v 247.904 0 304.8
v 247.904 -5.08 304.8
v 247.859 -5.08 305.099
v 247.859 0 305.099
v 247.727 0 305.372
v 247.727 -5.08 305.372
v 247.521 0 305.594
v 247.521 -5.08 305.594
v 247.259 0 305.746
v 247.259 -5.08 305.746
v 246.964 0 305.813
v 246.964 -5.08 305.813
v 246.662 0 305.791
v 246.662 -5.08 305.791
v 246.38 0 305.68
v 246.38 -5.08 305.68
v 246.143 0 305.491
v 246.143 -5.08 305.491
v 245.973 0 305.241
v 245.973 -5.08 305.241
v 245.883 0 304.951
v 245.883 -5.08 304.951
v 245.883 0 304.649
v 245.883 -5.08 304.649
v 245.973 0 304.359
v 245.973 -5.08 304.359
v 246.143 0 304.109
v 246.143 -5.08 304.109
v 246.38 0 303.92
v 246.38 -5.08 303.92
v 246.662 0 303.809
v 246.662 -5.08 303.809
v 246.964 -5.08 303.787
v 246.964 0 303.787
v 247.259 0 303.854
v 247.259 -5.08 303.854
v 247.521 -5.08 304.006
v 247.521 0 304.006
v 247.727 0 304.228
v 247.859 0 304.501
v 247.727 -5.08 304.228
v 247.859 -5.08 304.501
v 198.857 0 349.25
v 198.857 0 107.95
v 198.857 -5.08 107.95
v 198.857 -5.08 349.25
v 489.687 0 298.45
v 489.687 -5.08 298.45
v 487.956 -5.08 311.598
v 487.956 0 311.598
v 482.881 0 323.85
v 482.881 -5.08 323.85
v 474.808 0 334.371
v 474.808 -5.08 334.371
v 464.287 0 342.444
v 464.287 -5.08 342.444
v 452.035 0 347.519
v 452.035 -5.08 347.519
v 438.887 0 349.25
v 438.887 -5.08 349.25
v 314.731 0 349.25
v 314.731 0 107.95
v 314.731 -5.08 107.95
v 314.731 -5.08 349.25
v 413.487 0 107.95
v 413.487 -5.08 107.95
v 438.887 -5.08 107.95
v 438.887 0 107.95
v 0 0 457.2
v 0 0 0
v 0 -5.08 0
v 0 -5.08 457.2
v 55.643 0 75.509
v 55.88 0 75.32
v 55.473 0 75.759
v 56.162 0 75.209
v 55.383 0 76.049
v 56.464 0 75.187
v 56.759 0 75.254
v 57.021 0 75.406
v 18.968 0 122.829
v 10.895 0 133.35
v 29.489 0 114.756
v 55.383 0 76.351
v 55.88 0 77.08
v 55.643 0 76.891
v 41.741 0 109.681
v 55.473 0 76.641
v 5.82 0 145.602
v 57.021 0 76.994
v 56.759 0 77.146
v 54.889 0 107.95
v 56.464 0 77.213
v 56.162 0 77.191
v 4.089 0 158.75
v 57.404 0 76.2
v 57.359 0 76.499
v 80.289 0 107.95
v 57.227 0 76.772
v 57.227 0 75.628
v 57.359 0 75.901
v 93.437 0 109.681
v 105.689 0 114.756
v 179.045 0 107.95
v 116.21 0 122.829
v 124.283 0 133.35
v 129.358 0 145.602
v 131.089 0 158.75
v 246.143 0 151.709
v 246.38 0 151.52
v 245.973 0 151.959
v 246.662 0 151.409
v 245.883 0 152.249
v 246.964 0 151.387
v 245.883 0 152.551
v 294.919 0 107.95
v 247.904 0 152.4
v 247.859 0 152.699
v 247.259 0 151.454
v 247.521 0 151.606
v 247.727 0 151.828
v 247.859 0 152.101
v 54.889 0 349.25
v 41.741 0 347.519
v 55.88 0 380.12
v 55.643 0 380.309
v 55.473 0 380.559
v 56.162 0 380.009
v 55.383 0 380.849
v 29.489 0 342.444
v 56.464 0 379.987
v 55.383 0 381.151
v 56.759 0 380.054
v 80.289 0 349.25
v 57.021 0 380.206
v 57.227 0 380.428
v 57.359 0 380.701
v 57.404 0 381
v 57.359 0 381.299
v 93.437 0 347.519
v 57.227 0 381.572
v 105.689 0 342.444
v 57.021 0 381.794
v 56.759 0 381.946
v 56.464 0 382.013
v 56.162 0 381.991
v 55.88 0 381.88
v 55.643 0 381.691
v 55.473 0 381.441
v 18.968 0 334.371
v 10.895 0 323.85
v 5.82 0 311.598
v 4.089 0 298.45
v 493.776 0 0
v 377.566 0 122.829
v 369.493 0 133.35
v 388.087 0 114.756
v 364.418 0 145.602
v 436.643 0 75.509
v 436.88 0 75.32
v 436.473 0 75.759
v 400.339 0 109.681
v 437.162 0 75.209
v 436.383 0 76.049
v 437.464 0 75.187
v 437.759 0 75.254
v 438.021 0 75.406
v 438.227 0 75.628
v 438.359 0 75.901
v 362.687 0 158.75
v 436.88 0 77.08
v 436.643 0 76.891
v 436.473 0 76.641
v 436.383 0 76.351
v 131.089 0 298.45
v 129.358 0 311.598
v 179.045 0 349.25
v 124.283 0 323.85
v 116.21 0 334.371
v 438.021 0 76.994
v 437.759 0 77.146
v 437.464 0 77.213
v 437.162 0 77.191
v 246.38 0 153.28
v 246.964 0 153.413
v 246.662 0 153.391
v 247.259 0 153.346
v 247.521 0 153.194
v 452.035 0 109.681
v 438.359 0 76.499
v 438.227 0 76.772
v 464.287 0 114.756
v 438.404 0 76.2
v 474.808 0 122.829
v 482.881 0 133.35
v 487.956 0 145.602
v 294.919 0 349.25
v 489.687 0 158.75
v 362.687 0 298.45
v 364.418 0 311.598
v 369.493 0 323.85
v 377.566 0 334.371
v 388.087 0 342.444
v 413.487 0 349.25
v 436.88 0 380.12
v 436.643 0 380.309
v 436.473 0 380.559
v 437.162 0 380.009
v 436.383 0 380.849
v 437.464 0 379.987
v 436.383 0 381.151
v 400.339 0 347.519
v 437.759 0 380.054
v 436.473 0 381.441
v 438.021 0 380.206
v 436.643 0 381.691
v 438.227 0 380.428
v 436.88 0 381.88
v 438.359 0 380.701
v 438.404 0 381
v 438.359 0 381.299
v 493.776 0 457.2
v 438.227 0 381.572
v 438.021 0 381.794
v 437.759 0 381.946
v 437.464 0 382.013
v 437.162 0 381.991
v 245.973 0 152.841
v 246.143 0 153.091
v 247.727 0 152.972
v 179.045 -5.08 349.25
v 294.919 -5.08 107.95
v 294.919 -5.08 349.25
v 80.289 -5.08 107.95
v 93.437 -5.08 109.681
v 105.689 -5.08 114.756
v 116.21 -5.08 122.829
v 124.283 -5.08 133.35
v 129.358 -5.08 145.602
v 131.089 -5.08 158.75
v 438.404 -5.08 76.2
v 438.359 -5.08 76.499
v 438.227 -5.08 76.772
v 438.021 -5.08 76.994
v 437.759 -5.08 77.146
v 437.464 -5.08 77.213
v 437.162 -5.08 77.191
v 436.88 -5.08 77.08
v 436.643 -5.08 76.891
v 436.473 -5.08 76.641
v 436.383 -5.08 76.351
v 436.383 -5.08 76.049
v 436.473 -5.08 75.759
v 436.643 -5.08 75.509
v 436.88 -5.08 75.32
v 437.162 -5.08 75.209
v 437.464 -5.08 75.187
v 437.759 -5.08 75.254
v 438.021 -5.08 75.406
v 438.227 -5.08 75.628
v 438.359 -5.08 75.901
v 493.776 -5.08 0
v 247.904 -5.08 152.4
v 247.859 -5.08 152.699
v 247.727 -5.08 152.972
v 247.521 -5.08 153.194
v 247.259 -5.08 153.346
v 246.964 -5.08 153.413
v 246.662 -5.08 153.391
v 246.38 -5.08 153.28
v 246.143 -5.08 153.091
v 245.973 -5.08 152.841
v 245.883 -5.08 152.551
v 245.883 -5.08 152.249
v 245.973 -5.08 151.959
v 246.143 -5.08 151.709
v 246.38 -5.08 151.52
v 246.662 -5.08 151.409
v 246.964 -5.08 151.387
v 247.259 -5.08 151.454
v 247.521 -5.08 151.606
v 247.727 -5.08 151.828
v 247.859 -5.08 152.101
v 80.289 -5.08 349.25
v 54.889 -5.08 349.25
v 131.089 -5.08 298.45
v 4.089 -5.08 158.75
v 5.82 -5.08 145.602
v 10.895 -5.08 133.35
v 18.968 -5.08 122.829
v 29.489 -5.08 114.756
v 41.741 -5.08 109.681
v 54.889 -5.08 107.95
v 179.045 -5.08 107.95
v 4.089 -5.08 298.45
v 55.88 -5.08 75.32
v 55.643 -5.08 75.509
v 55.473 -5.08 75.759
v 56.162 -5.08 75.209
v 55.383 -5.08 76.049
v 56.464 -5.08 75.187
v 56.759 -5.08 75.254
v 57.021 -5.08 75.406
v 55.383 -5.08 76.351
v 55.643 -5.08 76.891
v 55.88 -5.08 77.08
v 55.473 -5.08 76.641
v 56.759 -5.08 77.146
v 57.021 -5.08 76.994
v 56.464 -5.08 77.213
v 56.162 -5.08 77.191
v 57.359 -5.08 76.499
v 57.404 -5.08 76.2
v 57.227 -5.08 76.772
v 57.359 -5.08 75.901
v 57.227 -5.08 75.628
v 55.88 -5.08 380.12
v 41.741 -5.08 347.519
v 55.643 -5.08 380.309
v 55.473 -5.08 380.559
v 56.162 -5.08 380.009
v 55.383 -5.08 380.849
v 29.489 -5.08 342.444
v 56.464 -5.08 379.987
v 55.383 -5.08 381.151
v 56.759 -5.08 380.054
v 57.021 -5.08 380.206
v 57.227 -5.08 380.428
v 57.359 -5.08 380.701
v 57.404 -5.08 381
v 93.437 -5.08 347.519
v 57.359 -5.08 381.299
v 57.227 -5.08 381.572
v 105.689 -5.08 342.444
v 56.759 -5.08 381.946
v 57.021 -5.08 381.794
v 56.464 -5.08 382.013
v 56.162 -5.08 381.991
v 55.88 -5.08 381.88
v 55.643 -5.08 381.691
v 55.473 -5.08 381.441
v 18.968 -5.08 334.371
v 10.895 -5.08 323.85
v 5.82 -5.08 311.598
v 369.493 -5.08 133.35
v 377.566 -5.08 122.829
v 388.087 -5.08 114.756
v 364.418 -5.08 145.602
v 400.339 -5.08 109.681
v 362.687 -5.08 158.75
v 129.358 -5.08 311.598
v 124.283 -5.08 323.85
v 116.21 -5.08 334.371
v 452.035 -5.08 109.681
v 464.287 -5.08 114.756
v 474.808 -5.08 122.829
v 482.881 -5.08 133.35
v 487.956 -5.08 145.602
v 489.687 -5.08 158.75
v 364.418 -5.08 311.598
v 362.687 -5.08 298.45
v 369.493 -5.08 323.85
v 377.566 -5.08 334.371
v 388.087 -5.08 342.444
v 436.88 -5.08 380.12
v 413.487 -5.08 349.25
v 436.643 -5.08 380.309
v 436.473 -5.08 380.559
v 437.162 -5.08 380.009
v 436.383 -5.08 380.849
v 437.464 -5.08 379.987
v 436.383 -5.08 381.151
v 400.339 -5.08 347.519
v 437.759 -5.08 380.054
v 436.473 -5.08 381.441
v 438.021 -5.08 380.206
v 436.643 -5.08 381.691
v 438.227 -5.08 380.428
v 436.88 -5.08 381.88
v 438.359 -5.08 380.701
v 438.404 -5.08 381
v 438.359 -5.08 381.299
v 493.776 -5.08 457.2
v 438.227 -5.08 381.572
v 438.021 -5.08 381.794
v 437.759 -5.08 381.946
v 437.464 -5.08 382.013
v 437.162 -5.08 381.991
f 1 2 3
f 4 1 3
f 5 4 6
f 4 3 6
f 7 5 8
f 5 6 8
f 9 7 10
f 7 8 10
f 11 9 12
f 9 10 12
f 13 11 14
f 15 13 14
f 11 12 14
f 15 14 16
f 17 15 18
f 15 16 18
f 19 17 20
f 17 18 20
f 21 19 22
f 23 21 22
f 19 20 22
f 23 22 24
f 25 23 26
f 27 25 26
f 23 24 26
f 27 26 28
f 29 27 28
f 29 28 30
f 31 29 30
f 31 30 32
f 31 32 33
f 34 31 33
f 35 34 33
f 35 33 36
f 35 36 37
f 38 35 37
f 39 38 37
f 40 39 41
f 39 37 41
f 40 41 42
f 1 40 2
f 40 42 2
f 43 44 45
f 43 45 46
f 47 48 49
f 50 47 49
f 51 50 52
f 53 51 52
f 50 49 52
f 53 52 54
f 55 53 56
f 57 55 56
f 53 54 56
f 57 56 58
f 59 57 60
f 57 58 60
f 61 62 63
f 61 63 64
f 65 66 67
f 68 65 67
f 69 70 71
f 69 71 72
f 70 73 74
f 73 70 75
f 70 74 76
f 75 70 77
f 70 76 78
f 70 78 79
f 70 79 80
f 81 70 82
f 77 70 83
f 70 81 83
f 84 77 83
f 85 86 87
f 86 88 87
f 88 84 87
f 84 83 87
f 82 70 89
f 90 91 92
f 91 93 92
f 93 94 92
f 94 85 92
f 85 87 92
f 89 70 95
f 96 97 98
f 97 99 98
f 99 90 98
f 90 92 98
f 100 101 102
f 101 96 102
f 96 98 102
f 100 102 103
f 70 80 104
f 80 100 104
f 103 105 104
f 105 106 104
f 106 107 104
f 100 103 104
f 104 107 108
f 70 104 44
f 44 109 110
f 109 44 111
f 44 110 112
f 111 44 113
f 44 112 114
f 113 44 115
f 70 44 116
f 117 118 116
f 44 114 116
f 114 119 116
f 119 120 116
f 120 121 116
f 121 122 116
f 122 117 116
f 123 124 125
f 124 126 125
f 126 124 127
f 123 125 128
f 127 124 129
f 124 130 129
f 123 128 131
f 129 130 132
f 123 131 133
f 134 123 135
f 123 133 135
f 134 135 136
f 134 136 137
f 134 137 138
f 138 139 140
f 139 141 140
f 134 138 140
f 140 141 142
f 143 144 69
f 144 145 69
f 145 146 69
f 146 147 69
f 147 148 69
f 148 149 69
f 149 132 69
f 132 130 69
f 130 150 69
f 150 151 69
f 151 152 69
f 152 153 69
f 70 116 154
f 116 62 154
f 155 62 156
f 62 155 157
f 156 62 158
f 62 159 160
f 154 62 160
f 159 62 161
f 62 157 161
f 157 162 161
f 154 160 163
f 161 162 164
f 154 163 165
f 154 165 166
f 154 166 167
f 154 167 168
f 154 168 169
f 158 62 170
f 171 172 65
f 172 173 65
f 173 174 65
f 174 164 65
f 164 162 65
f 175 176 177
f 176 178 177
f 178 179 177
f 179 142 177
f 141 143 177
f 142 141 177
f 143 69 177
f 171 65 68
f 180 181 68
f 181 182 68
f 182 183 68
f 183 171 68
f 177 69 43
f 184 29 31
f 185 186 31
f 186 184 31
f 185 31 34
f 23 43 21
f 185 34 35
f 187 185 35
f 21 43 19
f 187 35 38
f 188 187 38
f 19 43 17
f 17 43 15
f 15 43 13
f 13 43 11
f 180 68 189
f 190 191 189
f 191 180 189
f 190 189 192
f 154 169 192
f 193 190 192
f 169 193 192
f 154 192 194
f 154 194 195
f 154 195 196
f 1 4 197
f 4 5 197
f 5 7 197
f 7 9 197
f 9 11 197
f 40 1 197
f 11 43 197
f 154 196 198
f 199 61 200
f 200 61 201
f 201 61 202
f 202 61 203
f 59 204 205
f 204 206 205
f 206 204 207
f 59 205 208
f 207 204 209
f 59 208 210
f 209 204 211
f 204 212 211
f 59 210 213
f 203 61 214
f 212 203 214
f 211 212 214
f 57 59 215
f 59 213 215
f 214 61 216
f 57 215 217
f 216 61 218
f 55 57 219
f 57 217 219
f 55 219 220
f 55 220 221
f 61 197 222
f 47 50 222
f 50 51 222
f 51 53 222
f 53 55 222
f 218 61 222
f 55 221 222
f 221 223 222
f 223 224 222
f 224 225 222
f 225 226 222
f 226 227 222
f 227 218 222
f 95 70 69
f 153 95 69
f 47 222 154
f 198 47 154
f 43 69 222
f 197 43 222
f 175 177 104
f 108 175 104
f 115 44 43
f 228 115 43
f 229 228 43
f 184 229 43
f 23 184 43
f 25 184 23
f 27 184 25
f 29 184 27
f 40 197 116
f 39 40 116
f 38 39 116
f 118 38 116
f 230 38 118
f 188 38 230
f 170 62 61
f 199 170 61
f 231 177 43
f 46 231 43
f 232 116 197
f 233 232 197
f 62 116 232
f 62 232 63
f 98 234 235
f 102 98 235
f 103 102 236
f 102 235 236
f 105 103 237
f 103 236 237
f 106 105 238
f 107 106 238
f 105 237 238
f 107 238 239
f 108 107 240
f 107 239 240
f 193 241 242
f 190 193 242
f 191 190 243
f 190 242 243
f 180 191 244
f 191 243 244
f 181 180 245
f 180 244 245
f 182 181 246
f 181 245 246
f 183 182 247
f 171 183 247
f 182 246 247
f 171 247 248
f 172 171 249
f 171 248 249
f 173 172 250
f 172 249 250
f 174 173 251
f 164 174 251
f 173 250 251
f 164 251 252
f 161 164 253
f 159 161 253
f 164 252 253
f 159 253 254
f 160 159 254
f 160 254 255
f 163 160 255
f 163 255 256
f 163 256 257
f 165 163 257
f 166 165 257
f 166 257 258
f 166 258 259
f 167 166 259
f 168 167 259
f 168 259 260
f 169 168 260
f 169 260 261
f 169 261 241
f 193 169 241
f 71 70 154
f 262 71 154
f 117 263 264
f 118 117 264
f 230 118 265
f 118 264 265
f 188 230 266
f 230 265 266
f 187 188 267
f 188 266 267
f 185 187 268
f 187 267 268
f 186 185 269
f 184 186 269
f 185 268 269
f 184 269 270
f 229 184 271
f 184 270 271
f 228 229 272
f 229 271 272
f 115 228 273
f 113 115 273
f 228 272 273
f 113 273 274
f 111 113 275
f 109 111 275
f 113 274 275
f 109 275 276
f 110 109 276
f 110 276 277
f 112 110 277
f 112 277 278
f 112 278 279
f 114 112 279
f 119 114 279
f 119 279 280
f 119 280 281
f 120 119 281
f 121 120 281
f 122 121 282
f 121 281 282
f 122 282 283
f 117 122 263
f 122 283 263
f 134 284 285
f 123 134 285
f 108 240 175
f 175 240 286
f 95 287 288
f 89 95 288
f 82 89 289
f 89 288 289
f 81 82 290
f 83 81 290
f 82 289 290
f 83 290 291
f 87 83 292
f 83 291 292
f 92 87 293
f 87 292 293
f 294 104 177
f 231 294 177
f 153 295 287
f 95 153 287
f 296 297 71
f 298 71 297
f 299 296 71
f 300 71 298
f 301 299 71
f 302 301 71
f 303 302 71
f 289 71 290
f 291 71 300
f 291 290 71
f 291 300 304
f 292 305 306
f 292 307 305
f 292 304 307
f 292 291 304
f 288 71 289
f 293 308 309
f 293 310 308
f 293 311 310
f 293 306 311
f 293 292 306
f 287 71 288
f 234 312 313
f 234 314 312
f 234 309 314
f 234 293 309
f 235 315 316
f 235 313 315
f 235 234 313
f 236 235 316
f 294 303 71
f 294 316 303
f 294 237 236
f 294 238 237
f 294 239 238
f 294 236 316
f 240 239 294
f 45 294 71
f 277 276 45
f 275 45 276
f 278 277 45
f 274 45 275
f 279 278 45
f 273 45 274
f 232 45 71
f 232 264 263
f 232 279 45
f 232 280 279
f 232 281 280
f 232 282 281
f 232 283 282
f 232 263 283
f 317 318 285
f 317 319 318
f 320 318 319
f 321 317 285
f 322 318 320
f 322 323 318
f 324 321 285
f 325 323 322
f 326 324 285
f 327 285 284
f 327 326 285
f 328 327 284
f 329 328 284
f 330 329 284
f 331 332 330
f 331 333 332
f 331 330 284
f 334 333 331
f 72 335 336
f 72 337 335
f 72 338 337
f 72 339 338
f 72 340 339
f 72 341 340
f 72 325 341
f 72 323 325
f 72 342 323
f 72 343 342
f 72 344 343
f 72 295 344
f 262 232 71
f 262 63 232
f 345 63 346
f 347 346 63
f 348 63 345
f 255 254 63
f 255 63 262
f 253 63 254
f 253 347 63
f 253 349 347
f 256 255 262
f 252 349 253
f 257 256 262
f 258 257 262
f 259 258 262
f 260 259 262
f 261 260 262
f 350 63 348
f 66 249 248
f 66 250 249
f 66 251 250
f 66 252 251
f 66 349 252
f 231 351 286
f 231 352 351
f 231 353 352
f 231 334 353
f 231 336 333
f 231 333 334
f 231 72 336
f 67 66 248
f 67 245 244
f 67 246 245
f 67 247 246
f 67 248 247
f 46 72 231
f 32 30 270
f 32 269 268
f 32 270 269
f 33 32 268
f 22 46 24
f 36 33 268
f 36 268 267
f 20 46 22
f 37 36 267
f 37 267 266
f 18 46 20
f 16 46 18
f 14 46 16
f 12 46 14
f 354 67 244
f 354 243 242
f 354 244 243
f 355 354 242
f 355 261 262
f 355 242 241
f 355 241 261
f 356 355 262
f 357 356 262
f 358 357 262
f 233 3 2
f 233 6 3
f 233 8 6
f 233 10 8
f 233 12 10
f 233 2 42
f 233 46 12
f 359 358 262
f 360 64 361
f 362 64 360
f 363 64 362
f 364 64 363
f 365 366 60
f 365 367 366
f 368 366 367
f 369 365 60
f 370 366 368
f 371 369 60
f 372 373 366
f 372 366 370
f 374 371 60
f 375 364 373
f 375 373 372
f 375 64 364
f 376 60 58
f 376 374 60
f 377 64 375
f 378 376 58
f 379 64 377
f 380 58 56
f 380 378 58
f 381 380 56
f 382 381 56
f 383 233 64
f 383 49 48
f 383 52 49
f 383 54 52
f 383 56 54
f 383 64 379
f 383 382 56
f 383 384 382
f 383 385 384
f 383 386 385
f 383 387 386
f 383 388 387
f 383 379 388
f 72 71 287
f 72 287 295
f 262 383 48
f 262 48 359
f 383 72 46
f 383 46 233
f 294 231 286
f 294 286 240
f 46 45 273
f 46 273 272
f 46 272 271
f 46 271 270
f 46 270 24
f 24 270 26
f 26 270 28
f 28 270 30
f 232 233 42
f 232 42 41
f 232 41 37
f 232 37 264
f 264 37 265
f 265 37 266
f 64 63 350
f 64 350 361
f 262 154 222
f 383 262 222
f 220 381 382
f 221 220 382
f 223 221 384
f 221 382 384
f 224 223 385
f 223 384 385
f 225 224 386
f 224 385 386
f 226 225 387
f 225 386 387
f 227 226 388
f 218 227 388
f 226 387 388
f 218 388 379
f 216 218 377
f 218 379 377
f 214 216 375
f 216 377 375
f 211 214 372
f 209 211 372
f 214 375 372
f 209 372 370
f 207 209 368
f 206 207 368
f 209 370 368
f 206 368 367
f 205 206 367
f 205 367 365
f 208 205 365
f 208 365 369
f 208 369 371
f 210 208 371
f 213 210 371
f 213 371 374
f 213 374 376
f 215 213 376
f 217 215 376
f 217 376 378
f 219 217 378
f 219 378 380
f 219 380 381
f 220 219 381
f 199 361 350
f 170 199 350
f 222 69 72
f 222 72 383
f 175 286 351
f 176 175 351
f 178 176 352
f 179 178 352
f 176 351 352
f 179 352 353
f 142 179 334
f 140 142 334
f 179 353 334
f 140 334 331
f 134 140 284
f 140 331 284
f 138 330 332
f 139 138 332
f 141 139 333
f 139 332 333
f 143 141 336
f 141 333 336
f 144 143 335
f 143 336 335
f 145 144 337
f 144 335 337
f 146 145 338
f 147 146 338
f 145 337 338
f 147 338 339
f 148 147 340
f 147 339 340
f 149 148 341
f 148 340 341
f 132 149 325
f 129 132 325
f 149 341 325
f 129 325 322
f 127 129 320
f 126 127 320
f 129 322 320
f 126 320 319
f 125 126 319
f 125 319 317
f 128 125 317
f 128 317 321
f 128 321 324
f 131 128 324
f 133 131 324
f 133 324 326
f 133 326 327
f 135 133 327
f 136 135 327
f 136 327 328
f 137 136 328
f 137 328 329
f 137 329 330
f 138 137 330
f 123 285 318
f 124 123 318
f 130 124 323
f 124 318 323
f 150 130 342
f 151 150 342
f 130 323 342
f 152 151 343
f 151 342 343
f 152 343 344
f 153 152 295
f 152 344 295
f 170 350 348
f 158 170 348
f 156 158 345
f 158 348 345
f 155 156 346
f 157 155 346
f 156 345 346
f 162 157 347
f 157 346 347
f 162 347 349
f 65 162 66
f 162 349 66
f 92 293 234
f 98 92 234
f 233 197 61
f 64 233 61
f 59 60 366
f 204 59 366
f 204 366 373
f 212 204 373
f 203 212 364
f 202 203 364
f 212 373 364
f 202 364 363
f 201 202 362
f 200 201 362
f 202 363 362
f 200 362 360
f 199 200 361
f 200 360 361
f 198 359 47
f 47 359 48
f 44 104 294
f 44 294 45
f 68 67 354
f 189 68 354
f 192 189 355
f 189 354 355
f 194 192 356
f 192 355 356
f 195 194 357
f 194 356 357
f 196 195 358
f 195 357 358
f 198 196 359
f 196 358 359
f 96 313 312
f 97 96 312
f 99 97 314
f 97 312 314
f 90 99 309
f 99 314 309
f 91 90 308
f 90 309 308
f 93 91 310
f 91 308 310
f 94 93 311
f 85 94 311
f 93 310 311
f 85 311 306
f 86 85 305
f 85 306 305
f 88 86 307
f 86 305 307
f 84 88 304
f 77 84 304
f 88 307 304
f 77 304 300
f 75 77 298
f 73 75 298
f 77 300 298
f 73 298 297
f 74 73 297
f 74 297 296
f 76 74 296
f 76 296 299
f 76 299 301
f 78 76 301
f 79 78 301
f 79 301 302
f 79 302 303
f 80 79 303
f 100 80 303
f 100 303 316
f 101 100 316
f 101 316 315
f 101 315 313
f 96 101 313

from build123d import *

# Parameters (mm, degrees)
F0_W     = 493.776
F0_H     = 457.2
F0_W_2   = 19.812
F0_H_2   = 241.3
F1_DEPTH = 5.08
F2_R     = 1.016
F3_DEPTH = 5.081
F5_DEPTH = 5.081
F6_DEPTH = 5.08


# Not quite as in the source:
# - a feature names something its author has since deleted; it is built from what else it names


with BuildPart() as f1:
    # F0 (on Front) → F1 (new body)
    with BuildSketch(Plane.XZ):
        with Locations((246.888, 228.6)):
            Rectangle(F0_W, F0_H)
        with Locations((188.9506, 228.6)):
            Rectangle(F0_W_2, F0_H_2, mode=Mode.SUBTRACT)
        with Locations((304.8254, 228.6)):
            Rectangle(F0_W_2, F0_H_2, mode=Mode.SUBTRACT)
    extrude(amount=F1_DEPTH)

    # F2 (on face) → F3 (cut, through all)
    with BuildSketch(Plane.XZ.offset(5.08)):
        with Locations((56.388, 381)):
            Circle(F2_R)
        with Locations((56.388, 76.2)):
            Circle(F2_R)
        with Locations((437.388, 76.2)):
            Circle(F2_R)
        with Locations((437.388, 381)):
            Circle(F2_R)
    extrude(amount=-F3_DEPTH, mode=Mode.SUBTRACT)

    # F4 (on face) → F5 (cut, through all)
    with BuildSketch(Plane.XZ.offset(5.08)):
        with BuildLine():
            Line((80.2894, 349.25), (54.8894, 349.25))
            ThreePointArc((54.8894, 349.25), (18.9683755157, 334.3710244843), (4.0894, 298.45))
            Line((4.0894, 298.45), (4.0894, 158.75))
            ThreePointArc((4.0894, 158.75), (18.9683755157, 122.8289755157), (54.8894, 107.95))
            Line((54.8894, 107.95), (80.2894, 107.95))
            ThreePointArc((80.2894, 107.95), (116.2104244843, 122.8289755157), (131.0894, 158.75))
            Line((131.0894, 158.75), (131.0894, 298.45))
            ThreePointArc((131.0894, 298.45), (116.2104244843, 334.3710244843), (80.2894, 349.25))
        make_face()
        with BuildLine():
            Line((438.8866, 349.25), (413.4866, 349.25))
            ThreePointArc((413.4866, 349.25), (377.5655755157, 334.3710244843), (362.6866, 298.45))
            Line((362.6866, 298.45), (362.6866, 158.75))
            ThreePointArc((362.6866, 158.75), (377.5655755157, 122.8289755157), (413.4866, 107.95))
            Line((413.4866, 107.95), (438.8866, 107.95))
            ThreePointArc((438.8866, 107.95), (474.8076244843, 122.8289755157), (489.6866, 158.75))
            Line((489.6866, 158.75), (489.6866, 298.45))
            ThreePointArc((489.6866, 298.45), (474.8076244843, 334.3710244843), (438.8866, 349.25))
        make_face()
    extrude(amount=-F5_DEPTH, mode=Mode.SUBTRACT)

    # F2 (on face) → F6 (cut, through all)
    with BuildSketch(Plane.XZ.offset(5.08)):
        with Locations((246.888, 304.8)):
            Circle(F2_R)
        with Locations((246.888, 152.4)):
            Circle(F2_R)
    extrude(amount=-F6_DEPTH, mode=Mode.SUBTRACT)


solid = f1.part
